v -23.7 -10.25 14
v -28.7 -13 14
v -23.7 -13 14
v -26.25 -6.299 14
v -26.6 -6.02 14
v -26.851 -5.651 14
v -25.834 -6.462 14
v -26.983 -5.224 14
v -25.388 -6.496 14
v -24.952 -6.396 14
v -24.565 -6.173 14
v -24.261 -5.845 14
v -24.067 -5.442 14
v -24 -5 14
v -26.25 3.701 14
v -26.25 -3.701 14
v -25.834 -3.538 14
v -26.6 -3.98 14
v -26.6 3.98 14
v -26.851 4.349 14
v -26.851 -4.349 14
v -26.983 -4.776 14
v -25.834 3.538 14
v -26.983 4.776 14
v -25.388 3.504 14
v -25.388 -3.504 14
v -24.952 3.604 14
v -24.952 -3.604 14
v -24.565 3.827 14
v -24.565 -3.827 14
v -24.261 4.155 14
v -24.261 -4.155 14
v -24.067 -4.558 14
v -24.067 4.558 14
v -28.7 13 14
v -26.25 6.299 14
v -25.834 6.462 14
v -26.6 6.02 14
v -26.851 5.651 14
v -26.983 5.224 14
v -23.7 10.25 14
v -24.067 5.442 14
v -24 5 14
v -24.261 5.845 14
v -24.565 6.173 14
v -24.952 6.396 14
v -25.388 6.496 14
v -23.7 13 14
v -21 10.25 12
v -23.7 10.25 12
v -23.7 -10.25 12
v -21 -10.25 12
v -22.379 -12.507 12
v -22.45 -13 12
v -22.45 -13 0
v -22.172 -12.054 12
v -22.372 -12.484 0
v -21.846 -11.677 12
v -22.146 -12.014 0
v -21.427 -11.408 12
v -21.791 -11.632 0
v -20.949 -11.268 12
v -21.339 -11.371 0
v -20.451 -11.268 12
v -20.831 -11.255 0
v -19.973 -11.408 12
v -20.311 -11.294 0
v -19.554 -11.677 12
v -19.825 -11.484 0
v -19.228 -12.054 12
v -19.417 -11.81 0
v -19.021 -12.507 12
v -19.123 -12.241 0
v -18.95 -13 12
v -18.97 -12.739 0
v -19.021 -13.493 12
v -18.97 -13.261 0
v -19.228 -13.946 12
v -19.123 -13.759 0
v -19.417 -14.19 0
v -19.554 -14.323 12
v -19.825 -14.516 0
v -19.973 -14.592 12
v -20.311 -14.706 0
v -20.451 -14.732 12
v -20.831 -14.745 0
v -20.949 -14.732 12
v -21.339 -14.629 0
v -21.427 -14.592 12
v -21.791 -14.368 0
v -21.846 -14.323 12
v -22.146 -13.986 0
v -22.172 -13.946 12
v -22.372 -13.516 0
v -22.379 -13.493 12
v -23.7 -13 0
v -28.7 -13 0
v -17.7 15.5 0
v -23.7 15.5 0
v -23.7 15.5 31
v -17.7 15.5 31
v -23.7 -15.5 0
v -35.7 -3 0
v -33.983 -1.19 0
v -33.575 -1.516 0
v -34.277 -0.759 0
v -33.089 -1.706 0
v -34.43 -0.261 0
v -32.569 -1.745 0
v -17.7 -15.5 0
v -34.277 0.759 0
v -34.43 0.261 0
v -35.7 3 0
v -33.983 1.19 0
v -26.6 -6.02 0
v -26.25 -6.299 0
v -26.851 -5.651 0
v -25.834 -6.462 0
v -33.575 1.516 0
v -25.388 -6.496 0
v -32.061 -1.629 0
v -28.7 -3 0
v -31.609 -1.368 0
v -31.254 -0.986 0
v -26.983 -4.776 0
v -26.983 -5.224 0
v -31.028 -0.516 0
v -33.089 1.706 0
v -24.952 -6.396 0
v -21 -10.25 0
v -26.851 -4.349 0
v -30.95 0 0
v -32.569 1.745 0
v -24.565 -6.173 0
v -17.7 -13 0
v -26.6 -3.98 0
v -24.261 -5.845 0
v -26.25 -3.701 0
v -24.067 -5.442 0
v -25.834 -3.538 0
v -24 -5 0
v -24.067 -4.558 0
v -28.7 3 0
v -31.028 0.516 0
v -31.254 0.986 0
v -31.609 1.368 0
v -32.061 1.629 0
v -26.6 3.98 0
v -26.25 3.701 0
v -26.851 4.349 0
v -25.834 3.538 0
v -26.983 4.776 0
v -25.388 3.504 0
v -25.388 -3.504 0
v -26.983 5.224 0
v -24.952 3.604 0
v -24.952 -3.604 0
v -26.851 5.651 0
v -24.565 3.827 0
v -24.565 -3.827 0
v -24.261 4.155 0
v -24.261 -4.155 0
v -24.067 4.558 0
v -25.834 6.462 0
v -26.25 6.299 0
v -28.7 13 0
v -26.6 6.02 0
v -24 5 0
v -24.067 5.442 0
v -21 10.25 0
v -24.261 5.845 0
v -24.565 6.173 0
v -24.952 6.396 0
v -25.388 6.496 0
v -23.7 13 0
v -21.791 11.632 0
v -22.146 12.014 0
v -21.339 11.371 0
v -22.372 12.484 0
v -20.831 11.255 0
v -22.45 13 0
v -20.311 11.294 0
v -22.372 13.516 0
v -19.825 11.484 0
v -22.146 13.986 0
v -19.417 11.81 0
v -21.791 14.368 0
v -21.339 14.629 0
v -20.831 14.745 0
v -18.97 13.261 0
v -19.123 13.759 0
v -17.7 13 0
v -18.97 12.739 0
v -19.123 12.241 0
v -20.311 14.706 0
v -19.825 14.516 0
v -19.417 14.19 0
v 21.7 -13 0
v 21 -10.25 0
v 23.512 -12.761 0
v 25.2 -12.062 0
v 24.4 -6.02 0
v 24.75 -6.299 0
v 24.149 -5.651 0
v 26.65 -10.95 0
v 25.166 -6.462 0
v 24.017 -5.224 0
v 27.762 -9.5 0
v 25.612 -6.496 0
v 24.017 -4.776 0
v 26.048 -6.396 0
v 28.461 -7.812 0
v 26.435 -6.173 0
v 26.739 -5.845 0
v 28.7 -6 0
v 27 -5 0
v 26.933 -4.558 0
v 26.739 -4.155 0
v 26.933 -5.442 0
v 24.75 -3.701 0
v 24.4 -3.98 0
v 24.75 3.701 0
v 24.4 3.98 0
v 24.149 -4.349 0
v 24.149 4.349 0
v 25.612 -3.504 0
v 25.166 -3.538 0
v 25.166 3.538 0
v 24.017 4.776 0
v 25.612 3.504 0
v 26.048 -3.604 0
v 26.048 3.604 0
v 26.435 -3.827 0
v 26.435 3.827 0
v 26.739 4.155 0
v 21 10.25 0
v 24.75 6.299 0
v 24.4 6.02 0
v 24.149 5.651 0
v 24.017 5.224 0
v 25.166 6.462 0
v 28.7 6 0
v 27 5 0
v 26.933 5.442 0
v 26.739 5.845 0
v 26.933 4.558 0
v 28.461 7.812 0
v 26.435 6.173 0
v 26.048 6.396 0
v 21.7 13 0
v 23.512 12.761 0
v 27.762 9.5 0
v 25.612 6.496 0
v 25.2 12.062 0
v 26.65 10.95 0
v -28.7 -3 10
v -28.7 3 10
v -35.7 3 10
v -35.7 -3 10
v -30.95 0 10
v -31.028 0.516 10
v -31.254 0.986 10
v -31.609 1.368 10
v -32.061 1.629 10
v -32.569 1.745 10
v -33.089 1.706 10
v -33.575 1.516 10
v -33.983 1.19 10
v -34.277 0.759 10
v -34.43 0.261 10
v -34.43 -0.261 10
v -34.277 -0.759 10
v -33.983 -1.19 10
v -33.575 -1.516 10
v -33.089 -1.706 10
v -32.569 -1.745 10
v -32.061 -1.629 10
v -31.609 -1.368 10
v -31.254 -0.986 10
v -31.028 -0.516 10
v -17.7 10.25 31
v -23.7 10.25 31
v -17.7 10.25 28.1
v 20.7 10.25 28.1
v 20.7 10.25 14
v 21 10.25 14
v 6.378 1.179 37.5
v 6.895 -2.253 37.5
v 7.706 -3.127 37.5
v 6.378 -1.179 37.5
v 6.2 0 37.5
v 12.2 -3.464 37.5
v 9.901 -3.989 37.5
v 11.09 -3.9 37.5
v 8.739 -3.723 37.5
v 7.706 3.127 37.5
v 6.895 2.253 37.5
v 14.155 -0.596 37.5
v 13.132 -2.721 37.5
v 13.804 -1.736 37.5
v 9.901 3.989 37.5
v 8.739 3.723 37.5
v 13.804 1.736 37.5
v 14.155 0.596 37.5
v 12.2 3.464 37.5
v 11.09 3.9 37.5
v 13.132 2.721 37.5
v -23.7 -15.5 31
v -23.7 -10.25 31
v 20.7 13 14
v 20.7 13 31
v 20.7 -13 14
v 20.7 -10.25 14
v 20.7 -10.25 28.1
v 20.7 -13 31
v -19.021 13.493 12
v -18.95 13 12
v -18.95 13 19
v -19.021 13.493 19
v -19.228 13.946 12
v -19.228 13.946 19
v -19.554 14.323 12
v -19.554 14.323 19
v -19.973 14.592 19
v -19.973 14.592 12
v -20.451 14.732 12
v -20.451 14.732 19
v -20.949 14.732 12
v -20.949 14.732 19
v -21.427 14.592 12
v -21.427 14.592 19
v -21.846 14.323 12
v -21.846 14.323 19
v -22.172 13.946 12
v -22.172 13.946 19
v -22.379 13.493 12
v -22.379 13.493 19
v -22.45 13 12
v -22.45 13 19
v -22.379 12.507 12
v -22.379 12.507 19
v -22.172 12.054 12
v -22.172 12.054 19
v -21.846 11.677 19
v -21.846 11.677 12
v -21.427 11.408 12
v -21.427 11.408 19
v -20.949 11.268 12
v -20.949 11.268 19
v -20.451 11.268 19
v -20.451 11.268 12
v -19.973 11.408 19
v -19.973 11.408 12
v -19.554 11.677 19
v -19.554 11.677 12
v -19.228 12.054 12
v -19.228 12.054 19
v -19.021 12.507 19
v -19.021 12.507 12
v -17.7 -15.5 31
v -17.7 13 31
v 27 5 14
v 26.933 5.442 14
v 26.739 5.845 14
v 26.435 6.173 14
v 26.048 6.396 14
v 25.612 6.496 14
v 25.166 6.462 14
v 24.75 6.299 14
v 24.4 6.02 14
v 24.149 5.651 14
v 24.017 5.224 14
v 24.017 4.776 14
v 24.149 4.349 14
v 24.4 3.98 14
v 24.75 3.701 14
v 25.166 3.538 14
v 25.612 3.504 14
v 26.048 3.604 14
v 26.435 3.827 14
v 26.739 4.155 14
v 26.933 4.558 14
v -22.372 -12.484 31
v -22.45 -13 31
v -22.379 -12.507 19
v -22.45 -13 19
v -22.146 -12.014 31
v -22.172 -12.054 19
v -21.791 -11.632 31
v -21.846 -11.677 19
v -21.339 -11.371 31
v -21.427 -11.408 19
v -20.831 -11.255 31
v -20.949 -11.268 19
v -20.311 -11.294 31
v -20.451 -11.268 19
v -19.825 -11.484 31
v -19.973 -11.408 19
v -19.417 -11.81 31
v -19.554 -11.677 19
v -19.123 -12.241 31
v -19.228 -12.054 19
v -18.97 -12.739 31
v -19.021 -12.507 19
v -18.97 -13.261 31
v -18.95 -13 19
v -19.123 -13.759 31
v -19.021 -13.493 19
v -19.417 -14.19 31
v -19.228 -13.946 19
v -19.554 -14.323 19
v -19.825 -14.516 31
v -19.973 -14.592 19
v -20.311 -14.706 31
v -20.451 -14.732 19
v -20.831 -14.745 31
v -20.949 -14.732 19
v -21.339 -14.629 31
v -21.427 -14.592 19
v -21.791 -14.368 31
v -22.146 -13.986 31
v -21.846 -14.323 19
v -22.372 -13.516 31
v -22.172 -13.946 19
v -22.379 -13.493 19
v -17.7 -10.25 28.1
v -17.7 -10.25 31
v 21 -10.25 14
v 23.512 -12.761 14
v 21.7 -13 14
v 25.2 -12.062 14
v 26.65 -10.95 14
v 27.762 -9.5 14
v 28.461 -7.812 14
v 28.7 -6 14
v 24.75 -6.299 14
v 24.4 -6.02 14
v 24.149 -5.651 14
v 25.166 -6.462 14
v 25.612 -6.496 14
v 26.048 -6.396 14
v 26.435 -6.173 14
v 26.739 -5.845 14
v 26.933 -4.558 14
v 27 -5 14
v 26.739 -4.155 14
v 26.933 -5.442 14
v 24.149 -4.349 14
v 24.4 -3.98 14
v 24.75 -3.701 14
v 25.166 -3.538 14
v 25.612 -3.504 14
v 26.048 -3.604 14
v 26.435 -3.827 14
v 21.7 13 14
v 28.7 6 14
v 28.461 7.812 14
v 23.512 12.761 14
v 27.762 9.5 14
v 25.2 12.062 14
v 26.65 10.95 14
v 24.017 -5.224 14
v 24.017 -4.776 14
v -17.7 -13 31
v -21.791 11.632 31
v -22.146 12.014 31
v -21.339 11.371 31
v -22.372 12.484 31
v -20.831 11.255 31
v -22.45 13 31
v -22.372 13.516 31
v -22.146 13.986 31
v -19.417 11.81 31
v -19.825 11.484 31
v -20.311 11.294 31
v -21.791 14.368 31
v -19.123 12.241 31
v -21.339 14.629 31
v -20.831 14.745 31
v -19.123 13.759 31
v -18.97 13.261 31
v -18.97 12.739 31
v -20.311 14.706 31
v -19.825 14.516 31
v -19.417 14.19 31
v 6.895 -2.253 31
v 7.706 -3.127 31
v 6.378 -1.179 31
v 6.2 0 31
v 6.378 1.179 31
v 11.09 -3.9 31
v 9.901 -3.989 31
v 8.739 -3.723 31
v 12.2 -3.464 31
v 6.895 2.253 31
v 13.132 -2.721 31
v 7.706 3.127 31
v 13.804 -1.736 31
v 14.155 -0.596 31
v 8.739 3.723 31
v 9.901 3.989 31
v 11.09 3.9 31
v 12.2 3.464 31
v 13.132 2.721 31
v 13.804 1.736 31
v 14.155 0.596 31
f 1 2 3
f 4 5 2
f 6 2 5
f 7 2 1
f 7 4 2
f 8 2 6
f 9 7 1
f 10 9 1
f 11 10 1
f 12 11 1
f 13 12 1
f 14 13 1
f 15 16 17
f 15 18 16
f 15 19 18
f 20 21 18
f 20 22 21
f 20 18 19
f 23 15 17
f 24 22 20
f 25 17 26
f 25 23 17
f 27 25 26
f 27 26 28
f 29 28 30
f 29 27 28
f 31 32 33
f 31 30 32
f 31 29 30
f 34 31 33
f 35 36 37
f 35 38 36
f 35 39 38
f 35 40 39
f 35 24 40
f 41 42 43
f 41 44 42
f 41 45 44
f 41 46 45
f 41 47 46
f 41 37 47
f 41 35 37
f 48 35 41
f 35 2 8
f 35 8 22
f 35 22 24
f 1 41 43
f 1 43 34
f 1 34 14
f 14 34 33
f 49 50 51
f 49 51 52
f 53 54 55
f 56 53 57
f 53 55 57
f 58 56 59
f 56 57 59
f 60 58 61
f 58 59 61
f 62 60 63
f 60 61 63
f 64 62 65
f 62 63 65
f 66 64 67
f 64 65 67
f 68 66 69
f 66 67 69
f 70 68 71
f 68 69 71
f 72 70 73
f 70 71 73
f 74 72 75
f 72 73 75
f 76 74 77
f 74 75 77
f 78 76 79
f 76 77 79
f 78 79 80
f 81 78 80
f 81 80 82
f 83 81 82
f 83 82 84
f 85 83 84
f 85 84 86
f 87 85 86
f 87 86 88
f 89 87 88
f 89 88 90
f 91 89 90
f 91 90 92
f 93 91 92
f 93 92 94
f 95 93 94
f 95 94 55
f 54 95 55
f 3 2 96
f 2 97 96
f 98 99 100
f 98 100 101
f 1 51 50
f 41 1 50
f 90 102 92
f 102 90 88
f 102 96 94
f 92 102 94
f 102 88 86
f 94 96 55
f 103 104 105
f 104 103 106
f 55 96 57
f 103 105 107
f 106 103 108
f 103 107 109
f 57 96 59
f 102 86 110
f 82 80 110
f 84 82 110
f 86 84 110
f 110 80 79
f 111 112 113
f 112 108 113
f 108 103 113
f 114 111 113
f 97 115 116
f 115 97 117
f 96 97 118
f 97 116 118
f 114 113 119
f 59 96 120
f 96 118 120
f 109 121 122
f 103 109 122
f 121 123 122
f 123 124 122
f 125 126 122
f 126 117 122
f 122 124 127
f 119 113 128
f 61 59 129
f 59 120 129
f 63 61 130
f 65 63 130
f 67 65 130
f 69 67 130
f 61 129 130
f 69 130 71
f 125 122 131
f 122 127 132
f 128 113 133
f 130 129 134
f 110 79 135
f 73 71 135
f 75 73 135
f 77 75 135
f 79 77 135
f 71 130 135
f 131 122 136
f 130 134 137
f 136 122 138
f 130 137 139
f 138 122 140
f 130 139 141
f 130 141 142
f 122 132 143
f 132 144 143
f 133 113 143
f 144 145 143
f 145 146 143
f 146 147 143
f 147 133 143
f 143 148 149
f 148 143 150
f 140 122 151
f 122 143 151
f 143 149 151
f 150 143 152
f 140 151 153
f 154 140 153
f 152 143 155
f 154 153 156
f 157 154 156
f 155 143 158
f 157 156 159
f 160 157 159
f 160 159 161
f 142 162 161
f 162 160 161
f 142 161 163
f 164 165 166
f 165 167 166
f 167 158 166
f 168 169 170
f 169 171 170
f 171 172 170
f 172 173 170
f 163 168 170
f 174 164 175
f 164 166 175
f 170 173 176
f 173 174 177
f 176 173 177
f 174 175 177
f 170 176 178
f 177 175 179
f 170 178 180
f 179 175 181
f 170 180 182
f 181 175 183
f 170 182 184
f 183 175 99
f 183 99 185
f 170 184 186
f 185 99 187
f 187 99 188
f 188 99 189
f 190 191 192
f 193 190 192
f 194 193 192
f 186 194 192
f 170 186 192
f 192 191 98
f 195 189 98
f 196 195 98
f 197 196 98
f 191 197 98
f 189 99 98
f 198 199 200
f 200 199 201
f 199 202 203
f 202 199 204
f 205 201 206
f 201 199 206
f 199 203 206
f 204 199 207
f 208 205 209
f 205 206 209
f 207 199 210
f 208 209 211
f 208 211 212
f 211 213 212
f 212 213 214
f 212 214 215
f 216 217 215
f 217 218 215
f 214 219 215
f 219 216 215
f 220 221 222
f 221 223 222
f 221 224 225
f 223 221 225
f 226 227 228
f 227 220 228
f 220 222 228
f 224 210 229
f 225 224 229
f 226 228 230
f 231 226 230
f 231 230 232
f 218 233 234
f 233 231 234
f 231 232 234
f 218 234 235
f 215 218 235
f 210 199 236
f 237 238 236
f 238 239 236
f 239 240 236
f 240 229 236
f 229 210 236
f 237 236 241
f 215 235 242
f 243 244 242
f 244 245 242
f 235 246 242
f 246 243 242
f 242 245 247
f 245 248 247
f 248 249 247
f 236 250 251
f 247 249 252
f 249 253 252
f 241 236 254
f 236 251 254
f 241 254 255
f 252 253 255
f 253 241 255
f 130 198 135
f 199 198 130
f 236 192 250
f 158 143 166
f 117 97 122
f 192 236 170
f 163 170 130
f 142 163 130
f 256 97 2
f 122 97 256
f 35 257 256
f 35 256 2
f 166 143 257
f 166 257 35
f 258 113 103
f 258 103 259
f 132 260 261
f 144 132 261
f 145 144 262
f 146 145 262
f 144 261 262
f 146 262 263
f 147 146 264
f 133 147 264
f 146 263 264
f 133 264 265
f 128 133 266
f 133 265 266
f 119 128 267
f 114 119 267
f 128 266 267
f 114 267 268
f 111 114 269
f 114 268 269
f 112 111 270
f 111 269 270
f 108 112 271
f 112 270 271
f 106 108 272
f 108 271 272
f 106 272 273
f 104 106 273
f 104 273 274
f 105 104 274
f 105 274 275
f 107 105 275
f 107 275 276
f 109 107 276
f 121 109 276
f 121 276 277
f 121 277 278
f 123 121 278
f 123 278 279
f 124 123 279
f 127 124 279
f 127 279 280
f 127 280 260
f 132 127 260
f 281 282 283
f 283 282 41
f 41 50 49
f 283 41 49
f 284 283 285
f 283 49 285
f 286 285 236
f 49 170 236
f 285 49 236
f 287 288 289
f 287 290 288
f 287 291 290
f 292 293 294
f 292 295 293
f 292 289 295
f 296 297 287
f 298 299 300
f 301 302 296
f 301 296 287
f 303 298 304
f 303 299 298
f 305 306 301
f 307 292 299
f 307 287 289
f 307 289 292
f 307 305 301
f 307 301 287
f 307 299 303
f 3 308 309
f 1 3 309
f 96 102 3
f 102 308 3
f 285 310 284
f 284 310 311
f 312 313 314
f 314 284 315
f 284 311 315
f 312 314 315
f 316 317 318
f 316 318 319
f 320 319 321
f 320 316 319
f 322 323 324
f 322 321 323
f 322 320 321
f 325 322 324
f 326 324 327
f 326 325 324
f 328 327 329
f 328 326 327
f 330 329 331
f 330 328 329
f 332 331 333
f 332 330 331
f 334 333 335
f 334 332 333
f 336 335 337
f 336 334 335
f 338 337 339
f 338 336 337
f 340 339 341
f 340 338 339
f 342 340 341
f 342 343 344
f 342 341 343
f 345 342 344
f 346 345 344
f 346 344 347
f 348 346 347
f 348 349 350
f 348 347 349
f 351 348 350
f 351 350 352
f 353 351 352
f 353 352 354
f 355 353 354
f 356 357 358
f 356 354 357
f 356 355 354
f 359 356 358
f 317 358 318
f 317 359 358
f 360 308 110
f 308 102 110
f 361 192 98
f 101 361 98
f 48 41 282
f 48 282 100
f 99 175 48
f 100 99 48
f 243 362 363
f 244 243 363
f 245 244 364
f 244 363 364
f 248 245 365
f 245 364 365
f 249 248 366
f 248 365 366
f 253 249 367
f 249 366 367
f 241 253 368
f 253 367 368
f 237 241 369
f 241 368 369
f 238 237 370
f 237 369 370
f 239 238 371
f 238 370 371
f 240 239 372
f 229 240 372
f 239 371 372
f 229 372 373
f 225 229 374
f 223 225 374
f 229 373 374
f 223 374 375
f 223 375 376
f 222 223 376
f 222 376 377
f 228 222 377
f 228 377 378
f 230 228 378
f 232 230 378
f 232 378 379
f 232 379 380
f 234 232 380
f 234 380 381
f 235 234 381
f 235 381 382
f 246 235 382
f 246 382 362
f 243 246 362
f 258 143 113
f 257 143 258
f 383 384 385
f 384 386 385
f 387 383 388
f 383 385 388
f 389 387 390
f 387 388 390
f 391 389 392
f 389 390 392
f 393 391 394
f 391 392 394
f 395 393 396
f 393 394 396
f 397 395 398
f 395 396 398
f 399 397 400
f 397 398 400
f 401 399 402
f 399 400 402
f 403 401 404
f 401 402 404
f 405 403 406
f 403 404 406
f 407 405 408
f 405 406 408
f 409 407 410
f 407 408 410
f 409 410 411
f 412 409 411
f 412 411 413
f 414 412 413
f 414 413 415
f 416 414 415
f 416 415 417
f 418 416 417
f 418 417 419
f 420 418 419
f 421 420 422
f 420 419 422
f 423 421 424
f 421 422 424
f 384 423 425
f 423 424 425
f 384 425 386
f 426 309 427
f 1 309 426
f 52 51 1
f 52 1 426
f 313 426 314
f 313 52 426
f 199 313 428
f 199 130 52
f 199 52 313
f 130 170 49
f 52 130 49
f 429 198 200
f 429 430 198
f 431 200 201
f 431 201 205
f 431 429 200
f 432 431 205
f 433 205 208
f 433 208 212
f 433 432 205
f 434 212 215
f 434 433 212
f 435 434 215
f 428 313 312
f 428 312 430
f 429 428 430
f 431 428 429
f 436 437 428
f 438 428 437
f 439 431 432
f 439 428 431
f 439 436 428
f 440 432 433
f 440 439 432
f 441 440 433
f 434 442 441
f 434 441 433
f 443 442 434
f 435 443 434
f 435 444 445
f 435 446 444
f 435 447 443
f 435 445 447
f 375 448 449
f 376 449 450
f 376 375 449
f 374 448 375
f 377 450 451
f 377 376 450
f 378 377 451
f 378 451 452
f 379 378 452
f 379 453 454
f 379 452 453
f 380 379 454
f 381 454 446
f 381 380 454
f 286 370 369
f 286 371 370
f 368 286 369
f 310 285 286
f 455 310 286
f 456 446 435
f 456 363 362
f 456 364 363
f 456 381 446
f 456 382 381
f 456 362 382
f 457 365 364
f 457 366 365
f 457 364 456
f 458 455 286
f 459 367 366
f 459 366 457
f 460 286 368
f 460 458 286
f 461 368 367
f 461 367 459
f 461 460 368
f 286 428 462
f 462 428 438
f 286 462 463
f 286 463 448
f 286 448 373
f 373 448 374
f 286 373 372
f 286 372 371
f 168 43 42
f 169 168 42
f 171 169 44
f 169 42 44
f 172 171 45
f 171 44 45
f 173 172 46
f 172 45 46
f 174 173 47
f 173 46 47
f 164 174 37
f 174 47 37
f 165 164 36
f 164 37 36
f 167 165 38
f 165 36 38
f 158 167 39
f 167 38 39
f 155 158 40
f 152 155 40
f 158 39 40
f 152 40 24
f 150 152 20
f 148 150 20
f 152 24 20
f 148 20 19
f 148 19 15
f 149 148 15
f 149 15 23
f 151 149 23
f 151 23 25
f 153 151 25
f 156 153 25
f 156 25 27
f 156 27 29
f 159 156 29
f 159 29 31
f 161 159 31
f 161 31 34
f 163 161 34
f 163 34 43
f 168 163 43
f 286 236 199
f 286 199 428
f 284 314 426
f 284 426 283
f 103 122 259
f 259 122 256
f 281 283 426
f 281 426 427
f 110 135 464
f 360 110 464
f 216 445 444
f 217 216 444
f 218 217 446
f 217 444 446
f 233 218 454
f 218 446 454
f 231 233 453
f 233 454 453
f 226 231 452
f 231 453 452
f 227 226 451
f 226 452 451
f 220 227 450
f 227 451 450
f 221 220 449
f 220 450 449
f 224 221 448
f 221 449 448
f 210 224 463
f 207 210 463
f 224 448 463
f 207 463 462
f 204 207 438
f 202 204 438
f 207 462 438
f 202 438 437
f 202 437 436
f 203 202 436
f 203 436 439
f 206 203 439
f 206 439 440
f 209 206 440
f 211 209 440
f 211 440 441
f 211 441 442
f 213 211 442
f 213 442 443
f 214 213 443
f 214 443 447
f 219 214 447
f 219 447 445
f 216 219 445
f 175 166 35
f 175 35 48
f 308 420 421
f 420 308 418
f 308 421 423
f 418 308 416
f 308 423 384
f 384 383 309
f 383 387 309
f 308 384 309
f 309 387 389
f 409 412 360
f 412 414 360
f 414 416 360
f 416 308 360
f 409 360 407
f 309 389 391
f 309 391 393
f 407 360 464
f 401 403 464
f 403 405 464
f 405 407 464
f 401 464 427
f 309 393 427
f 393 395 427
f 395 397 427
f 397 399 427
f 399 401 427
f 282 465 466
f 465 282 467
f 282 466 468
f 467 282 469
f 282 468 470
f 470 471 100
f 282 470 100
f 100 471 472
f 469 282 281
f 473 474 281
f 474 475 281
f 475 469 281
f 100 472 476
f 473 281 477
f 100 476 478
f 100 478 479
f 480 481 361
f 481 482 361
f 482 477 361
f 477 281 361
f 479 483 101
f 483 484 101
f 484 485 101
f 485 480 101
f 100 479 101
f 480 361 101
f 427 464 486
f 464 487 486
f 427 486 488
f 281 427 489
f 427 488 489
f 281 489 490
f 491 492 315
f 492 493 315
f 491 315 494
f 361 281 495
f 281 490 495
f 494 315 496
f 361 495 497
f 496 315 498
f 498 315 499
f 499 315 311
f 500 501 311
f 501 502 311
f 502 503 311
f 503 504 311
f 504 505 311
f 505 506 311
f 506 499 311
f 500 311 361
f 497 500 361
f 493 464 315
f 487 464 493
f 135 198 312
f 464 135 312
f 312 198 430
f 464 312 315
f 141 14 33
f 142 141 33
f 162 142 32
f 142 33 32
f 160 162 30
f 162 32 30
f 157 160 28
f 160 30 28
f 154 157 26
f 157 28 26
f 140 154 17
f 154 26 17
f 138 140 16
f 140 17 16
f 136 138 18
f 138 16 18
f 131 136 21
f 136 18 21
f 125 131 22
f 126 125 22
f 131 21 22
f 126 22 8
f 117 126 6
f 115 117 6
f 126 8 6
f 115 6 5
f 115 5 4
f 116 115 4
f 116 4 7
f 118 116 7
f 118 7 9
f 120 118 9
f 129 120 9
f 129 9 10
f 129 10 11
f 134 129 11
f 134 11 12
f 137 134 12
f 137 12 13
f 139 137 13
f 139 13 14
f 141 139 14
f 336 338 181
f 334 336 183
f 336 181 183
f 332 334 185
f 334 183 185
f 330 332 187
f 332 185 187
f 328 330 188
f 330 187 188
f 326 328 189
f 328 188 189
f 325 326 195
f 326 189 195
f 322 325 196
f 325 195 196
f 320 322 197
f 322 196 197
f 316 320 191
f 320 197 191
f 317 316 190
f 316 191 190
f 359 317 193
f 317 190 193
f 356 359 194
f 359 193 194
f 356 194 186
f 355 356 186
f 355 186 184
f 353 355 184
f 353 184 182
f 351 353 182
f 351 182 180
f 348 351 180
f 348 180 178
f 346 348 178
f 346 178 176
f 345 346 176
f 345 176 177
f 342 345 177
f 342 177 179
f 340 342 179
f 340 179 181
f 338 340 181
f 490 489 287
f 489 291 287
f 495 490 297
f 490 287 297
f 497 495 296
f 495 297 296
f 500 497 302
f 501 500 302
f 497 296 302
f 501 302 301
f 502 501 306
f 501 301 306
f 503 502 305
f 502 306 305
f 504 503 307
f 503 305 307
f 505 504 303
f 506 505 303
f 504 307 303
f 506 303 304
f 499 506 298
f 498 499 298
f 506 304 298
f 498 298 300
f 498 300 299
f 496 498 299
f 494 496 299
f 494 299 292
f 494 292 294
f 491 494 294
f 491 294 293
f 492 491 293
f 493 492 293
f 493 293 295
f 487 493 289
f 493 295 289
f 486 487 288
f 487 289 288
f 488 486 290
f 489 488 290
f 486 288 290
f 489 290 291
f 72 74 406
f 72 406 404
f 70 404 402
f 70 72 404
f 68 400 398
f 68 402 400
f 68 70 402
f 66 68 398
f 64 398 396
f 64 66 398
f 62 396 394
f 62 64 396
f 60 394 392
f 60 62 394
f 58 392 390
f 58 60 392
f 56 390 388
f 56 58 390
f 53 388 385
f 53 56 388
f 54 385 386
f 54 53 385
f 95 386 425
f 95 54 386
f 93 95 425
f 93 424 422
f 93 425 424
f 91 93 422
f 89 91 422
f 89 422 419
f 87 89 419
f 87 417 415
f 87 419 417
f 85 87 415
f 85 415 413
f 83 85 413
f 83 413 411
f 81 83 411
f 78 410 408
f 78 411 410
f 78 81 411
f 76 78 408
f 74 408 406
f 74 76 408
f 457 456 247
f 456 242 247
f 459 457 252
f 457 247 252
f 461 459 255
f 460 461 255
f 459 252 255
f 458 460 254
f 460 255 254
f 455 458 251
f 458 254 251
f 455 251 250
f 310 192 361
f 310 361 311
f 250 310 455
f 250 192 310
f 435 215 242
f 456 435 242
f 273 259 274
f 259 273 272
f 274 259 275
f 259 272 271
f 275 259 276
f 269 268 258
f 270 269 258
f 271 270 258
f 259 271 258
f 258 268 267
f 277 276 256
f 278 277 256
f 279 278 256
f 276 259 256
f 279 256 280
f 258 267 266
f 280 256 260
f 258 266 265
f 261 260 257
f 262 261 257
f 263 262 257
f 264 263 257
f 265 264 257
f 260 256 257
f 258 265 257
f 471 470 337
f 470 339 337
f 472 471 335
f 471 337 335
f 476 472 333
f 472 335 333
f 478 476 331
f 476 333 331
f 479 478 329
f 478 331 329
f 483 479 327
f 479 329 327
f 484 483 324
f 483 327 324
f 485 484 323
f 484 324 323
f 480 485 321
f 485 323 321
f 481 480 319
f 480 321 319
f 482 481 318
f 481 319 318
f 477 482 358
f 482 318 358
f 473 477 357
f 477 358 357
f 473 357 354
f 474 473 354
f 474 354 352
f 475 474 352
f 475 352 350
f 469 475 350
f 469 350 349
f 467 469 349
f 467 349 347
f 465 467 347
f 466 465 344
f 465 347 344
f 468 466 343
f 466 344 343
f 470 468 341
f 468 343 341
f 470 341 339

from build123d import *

# Parameters (mm, degrees)
SKETCH_1_W                  = 57.4
SKETCH_1_H                  = 28.5
EXTRUDE_1_DEPTH             = 12
SKETCH_2_W                  = 57.4
SKETCH_2_H                  = 26
EXTRUDE_2_DEPTH             = 19
SKETCH_3_W                  = 16.1
SKETCH_3_H                  = 20.5
CUT_EXTRUDE_1_DEPTH         = 7.7
SKETCH_4_W                  = 28.1
SKETCH_4_H                  = 20.5
CUT_EXTRUDE_2_DEPTH         = 41.7
SKETCH_5_W                  = 31
SKETCH_5_H                  = 20.5
CUT_EXTRUDE_3_DEPTH         = 0.3
CUT_EXTRUDE_4_DEPTH         = 2.9
SKETCH_7_W                  = 12
SKETCH_7_H                  = 2.5
CUT_EXTRUDE_5_DEPTH         = 46.4
CUT_EXTRUDE_6_DEPTH         = 7.7
CUT_EXTRUDE_7_DEPTH         = 14.1
CUT_EXTRUDE_8_DEPTH         = 3.3
SKETCH_11_W                 = 11
SKETCH_11_H                 = 12
EXTRUDE_3_DEPTH             = 2.5
SKETCH_12_W                 = 12
SKETCH_12_H                 = 2.75
EXTRUDE_4_DEPTH             = 6
SKETCH_13_W                 = 6
SKETCH_13_H                 = 12
EXTRUDE_5_DEPTH             = 2.5
SKETCH_14_W                 = 12
SKETCH_14_H                 = 5.25
EXTRUDE_6_DEPTH             = 6
SKETCH_15_W                 = 5
SKETCH_15_H                 = 2.5
CUT_EXTRUDE_9_DEPTH         = 45.999333328
SKETCH_16_W                 = 5
SKETCH_16_H                 = 2.5
CUT_EXTRUDE_10_DEPTH        = 45.999333328
SKETCH_17_W                 = 5
SKETCH_17_H                 = 26
EXTRUDE_7_DEPTH             = 2
SKETCH_18_W                 = 10
SKETCH_18_H                 = 6
EXTRUDE_8_DEPTH             = 7
SKETCH_19_W                 = 4
SKETCH_19_H                 = 6.5
HOLE_WIZARD_3_5_3_5_1_D     = 3.5
HOLE_WIZARD_3_5_3_5_1_DEPTH = 12
HOLE_WIZARD_3_5_3_5_2_D     = 3.5
HOLE_WIZARD_3_0_3_3_D       = 3
HOLE_WIZARD_3_0_3_3_DEPTH   = 37.5
HOLE_WIZARD_3_5_3_5_3_D     = 3.5
FILLET_1_R                  = 7
EXTRUDE_START               = -19
SKETCH_28_W                 = 6
SKETCH_28_H                 = 5.25
SKETCH_28_R                 = 1.75
EXTRUDE_9_DEPTH             = 7


with BuildPart() as part:
    # Эскиз1 → Бобышка-Вытянуть1 (new body)
    with BuildSketch(Plane.XY.offset(12)):
        with Locations((0, 1.25)):
            Rectangle(SKETCH_1_W, SKETCH_1_H)
    extrude(amount=-EXTRUDE_1_DEPTH)

    # Эскиз2 → Бобышка-Вытянуть2 (add)
    with BuildSketch(Plane.XY.offset(12)):
        Rectangle(SKETCH_2_W, SKETCH_2_H)
    extrude(amount=EXTRUDE_2_DEPTH)

    # Эскиз3 → Вырез-Вытянуть1 (cut)
    with BuildSketch(Plane.ZY.offset(28.7)):
        with Locations((20.05, 0)):
            Rectangle(SKETCH_3_W, SKETCH_3_H)
    extrude(amount=-CUT_EXTRUDE_1_DEPTH, mode=Mode.SUBTRACT)

    # Эскиз4 → Вырез-Вытянуть2 (cut)
    with BuildSketch(Plane.ZY.offset(21)):
        with Locations((14.05, 0)):
            Rectangle(SKETCH_4_W, SKETCH_4_H)
    extrude(amount=-CUT_EXTRUDE_2_DEPTH, mode=Mode.SUBTRACT)

    # Эскиз5 → Вырез-Вытянуть3 (cut)
    with BuildSketch(Plane.ZY.offset(-20.7)):
        with Locations((15.5, 0)):
            Rectangle(SKETCH_5_W, SKETCH_5_H)
    extrude(amount=-CUT_EXTRUDE_3_DEPTH, mode=Mode.SUBTRACT)

    # Эскиз6 → Вырез-Вытянуть4 (cut)
    with BuildSketch(Plane.XY.offset(31)):
        Polygon((28.7, -13), (28.7, 13), (20.7, 13), (20.7, 10.25), (21, 10.25), (21, -10.25), (20.7, -10.25), (20.7, -13), align=None)
    extrude(amount=-CUT_EXTRUDE_4_DEPTH, mode=Mode.SUBTRACT)

    # Эскиз7 → Вырез-Вытянуть5 (cut)
    with BuildSketch(Plane(origin=(28.7, 0, 0), x_dir=(0, 0, -1), z_dir=(1, 0, 0))):
        with Locations((-6, 14.25)):
            Rectangle(SKETCH_7_W, SKETCH_7_H)
    extrude(amount=-CUT_EXTRUDE_5_DEPTH, mode=Mode.SUBTRACT)

    # Эскиз8 → Вырез-Вытянуть6 (cut)
    with BuildSketch(Plane.ZY.offset(28.7)):
        Polygon((12, -13), (31, -13), (31, 13), (12, 13), (12, 10.25), (28.1, 10.25), (28.1, -10.25), (12, -10.25), align=None)
    extrude(amount=-CUT_EXTRUDE_6_DEPTH, mode=Mode.SUBTRACT)

    # Эскиз9 → Вырез-Вытянуть7 (cut)
    with BuildSketch(Plane.XY.offset(28.1)):
        Polygon((28.7, -13), (28.7, 13), (20.7, 13), (20.7, 10.25), (21, 10.25), (21, -10.25), (20.7, -10.25), (20.7, -13), align=None)
    extrude(amount=-CUT_EXTRUDE_7_DEPTH, mode=Mode.SUBTRACT)

    # Эскиз10 → Вырез-Вытянуть8 (cut)
    with BuildSketch(Plane.ZY.offset(21)):
        Polygon((12, -13), (31, -13), (31, 13), (12, 13), (12, 10.25), (28.1, 10.25), (28.1, -10.25), (12, -10.25), align=None)
    extrude(amount=-CUT_EXTRUDE_8_DEPTH, mode=Mode.SUBTRACT)

    # Эскиз11 → Бобышка-Вытянуть3 (add)
    with BuildSketch(Plane.XZ.offset(13)):
        with Locations((-23.2, 6)):
            Rectangle(SKETCH_11_W, SKETCH_11_H)
    extrude(amount=EXTRUDE_3_DEPTH)

    # Эскиз12 → Бобышка-Вытянуть4 (add)
    with BuildSketch(Plane.ZY.offset(17.7)):
        with Locations((25, -11.625)):
            Rectangle(SKETCH_12_W, SKETCH_12_H)
    extrude(amount=EXTRUDE_4_DEPTH)

    # Эскиз13 → Бобышка-Вытянуть5 (add)
    with BuildSketch(Plane.XZ.offset(13)):
        with Locations((-20.7, 25)):
            Rectangle(SKETCH_13_W, SKETCH_13_H)
    extrude(amount=EXTRUDE_5_DEPTH)

    # Эскиз14 → Бобышка-Вытянуть6 (add)
    with BuildSketch(Plane.ZY.offset(17.7)):
        with Locations((25, 12.875)):
            Rectangle(SKETCH_14_W, SKETCH_14_H)
    extrude(amount=EXTRUDE_6_DEPTH)

    # Эскиз15 → Вырез-Вытянуть9 (cut, through all)
    with BuildSketch(Plane(origin=(0, 0, 0), x_dir=(-1, 0, 0), z_dir=(0, 0, -1))):
        with Locations((26.2, -14.25)):
            Rectangle(SKETCH_15_W, SKETCH_15_H)
    extrude(amount=-CUT_EXTRUDE_9_DEPTH, mode=Mode.SUBTRACT)

    # Эскиз16 → Вырез-Вытянуть10 (cut, through all)
    with BuildSketch(Plane(origin=(0, 0, 0), x_dir=(-1, 0, 0), z_dir=(0, 0, -1))):
        with Locations((26.2, 14.25)):
            Rectangle(SKETCH_16_W, SKETCH_16_H)
    extrude(amount=-CUT_EXTRUDE_10_DEPTH, mode=Mode.SUBTRACT)

    # Эскиз17 → Бобышка-Вытянуть7 (add)
    with BuildSketch(Plane.XY.offset(12)):
        with Locations((-26.2, 0)):
            Rectangle(SKETCH_17_W, SKETCH_17_H)
    extrude(amount=EXTRUDE_7_DEPTH)

    # Эскиз18 → Бобышка-Вытянуть8 (add)
    with BuildSketch(Plane.ZY.offset(28.7)):
        with Locations((5, 0)):
            Rectangle(SKETCH_18_W, SKETCH_18_H)
    extrude(amount=EXTRUDE_8_DEPTH)

    # Эскиз19 → Повернуть1 (revolve)
    with BuildSketch(Plane.XZ, mode=Mode.PRIVATE) as revolve_1_sk:
        with Locations((12.2, 34.25)):
            Rectangle(SKETCH_19_W, SKETCH_19_H)
    revolve(revolve_1_sk.sketch.rotate(Axis((10.2, 0, 37.5), (0, 0, -1)), 180), axis=Axis((10.2, 0, 37.5), (0, 0, -1)))

    # Диаметр отверстия Ø3.5 (3.5)1
    with Locations(Plane.XY.offset(31)):
        with Locations((-20.7, 13), (-20.7, -13)):
            Hole(HOLE_WIZARD_3_5_3_5_1_D / 2, depth=HOLE_WIZARD_3_5_3_5_1_DEPTH)

    # Диаметр отверстия Ø3.5 (3.5)2 (through all)
    with Locations(Plane(origin=(0, 0, 0), x_dir=(-1, 0, 0), z_dir=(0, 0, -1))):
        with Locations((32.7, 0)):
            Hole(HOLE_WIZARD_3_5_3_5_2_D / 2)

    # Диаметр отверстия Ø3.0 (3)3
    with Locations(Plane(origin=(0, 0, 0), x_dir=(-1, 0, 0), z_dir=(0, 0, -1))):
        with Locations((-25.5, -5), (-25.5, 5), (25.5, -5), (25.5, 5)):
            Hole(HOLE_WIZARD_3_0_3_3_D / 2, depth=HOLE_WIZARD_3_0_3_3_DEPTH)

    # Диаметр отверстия Ø3.5 (3.5)3 (through all)
    with Locations(Plane.XY.offset(12)):
        with Locations((-20.7, 13), (-20.7, -13)):
            Hole(HOLE_WIZARD_3_5_3_5_3_D / 2)

    # Скругление1
    fillet_1_edges = [part.edges().sort_by_distance(p)[0] for p in [
        (28.7, 13, 7),
        (28.7, -13, 7),
    ]]
    fillet(fillet_1_edges, radius=FILLET_1_R)

    # Эскиз28 → Бобышка-Вытянуть9 (add)
    # profile 1 of 2: a face of its own
    with BuildSketch(Plane.XY.offset(31).offset(EXTRUDE_START)):
        with Locations((-20.7, 12.875)):
            Rectangle(SKETCH_28_W, SKETCH_28_H)
        with Locations((-20.7, 13)):
            Circle(SKETCH_28_R, mode=Mode.SUBTRACT)
    # profile 2 of 2: a face of its own
    with BuildSketch(Plane.XY.offset(31).offset(EXTRUDE_START)):
        with Locations((-20.7, -12.875)):
            Rectangle(SKETCH_28_W, SKETCH_28_H)
        with Locations((-20.7, -13)):
            Circle(SKETCH_28_R, mode=Mode.SUBTRACT)
    extrude(amount=EXTRUDE_9_DEPTH)


solid = part.part
